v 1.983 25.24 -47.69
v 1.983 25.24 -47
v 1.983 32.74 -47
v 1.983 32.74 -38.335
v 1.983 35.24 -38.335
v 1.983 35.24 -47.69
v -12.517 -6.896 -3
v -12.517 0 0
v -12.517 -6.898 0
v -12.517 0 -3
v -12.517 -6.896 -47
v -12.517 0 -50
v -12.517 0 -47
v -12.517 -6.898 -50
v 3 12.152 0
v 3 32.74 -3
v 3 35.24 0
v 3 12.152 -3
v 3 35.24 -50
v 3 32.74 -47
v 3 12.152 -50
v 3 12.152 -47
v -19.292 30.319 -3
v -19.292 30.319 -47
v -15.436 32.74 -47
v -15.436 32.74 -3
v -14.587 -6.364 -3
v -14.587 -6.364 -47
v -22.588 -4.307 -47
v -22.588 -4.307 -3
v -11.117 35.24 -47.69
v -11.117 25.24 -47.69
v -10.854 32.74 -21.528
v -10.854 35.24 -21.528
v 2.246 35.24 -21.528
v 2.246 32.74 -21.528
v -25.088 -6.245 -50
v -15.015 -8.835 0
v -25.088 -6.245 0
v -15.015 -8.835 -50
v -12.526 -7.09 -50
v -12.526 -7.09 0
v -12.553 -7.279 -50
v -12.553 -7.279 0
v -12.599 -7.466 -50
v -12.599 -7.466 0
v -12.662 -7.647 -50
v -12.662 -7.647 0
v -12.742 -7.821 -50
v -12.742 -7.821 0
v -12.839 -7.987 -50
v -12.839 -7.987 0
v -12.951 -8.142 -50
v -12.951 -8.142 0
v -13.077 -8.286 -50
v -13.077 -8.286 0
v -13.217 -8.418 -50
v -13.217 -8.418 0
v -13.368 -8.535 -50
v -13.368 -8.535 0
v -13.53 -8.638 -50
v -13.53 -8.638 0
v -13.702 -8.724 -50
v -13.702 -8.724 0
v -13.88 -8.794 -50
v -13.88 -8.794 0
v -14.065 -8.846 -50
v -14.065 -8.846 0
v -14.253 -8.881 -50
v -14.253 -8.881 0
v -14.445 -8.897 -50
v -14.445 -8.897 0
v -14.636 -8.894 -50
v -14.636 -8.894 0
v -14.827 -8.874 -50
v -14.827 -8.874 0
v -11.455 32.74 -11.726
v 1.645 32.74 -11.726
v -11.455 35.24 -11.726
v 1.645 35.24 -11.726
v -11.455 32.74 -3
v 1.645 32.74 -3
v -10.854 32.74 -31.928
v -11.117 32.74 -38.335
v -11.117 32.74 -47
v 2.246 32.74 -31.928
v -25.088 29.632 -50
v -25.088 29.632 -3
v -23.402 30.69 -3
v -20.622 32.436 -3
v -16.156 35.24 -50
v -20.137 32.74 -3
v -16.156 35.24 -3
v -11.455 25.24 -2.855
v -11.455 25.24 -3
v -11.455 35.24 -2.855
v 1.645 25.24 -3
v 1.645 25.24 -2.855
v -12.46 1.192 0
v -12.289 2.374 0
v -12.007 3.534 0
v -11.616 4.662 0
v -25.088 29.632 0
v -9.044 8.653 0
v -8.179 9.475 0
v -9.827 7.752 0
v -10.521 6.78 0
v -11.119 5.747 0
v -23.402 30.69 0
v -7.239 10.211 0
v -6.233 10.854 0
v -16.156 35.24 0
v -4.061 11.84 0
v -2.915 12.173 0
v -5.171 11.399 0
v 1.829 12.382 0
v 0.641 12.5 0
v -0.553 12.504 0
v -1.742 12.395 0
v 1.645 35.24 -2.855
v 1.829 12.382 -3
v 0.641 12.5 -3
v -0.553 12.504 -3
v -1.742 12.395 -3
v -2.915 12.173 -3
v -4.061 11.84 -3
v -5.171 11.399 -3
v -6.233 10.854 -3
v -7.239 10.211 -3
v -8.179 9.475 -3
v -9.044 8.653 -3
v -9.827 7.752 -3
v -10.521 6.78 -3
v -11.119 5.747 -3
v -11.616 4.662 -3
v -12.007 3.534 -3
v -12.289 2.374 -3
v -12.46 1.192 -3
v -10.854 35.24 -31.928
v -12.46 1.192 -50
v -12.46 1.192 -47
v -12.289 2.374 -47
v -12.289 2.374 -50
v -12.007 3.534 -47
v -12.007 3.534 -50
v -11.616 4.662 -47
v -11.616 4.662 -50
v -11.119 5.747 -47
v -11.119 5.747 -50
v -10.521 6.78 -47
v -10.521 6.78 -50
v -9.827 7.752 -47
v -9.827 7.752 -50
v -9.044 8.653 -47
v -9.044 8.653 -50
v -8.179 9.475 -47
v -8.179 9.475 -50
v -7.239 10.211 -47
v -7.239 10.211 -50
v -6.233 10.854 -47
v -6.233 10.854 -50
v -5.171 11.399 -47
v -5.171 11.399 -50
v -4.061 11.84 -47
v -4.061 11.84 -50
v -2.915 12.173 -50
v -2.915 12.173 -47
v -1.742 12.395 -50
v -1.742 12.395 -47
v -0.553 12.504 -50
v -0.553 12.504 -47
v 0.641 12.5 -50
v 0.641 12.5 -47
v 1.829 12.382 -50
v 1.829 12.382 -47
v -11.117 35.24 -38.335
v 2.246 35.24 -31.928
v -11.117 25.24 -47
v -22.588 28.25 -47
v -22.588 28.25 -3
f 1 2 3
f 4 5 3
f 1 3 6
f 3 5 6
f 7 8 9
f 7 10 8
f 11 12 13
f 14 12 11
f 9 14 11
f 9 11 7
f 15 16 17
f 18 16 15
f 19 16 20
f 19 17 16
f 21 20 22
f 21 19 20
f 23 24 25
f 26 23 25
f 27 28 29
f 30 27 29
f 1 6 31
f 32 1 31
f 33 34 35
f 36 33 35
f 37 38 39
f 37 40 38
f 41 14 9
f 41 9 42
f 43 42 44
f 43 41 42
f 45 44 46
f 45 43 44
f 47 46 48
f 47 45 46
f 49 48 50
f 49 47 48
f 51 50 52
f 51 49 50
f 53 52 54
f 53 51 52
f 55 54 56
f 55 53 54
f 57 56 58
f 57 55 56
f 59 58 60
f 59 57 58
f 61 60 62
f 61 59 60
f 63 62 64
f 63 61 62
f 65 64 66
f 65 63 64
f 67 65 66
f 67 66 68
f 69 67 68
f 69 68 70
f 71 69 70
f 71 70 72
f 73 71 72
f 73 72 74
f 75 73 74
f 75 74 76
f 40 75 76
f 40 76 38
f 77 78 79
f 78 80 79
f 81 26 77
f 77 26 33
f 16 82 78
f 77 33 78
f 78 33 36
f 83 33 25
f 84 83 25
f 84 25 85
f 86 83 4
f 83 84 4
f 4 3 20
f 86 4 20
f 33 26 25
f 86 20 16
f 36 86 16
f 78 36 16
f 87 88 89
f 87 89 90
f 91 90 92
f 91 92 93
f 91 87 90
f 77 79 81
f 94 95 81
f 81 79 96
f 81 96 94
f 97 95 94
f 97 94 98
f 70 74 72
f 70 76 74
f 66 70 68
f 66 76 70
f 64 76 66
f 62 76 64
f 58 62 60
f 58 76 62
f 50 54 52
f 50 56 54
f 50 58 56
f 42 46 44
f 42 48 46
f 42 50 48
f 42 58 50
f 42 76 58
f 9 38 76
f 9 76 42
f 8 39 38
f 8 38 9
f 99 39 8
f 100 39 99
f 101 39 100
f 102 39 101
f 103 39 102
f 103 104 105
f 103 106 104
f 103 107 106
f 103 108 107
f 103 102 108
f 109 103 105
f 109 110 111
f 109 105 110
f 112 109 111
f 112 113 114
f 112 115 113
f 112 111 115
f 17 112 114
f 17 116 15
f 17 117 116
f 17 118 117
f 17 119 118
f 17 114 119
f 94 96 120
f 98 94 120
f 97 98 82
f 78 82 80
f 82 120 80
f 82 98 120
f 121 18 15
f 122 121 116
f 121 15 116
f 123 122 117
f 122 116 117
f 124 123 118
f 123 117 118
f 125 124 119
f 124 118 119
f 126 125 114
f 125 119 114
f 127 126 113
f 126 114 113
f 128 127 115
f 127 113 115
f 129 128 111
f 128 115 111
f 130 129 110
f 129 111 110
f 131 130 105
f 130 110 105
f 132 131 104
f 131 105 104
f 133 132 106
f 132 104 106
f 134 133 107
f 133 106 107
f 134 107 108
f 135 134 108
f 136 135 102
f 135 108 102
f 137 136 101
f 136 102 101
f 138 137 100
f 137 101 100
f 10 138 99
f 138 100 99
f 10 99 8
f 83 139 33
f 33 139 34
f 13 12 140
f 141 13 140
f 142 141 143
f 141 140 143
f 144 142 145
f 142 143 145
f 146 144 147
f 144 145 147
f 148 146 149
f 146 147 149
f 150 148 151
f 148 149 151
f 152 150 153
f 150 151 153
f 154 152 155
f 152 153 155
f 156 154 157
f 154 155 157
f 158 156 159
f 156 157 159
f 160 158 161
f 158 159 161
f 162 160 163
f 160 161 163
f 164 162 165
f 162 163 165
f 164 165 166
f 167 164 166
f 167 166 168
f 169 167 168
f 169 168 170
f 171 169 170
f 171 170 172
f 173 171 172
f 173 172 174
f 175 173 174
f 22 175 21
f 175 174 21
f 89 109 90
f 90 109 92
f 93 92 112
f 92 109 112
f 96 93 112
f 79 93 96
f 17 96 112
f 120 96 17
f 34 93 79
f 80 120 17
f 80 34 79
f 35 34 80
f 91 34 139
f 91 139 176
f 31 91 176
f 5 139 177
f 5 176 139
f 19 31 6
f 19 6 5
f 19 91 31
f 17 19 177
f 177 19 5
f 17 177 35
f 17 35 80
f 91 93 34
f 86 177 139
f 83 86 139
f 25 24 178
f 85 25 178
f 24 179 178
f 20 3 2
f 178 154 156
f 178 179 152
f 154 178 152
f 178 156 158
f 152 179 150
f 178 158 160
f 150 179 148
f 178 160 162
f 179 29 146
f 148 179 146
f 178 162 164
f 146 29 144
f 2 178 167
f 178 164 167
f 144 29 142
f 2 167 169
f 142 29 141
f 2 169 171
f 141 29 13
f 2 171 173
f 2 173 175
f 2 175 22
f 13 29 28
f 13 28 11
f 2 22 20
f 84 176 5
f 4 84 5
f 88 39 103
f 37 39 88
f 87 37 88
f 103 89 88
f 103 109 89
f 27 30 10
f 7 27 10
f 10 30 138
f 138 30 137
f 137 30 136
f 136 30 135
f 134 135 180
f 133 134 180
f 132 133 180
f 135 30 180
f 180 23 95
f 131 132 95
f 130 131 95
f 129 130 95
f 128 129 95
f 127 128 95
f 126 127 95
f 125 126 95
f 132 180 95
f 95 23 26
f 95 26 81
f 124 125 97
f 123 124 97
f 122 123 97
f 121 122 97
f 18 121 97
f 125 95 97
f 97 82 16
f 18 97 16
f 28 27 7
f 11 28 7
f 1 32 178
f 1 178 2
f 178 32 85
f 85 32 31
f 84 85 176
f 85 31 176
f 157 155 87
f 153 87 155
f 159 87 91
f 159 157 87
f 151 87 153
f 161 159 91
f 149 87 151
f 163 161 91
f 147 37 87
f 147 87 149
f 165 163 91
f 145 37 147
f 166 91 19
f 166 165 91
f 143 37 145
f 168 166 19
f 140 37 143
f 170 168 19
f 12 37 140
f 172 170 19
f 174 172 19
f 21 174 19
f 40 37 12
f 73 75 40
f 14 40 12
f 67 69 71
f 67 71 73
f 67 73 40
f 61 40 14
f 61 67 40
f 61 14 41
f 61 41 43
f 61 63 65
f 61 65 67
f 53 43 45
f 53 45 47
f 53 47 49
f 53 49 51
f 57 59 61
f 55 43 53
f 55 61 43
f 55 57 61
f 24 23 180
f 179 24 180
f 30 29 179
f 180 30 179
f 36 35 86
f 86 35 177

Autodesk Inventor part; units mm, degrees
ref_plane "YZ Plane" through (0, 0, 0) normal (1, 0, 0) x (0, 1, 0)
ref_plane "XZ Plane" through (0, 0, 0) normal (0, 1, 0) x (-1, 0, 0)
ref_plane "XY Plane" through (0, 0, 0) normal (0, 0, 1) x (1, 0, 0)
sketch "Sketch1" plane through (0, 0, 0) normal (0, 0, 1) x (1, 0, 0)
  circle A0 centre (0, 0) radius 11 projected
  line L0 (9.8023, 37.5977) -> (3, 35.24) projected
  line L1 (3, 35.24) -> (3, 11.34) projected
  line L2 (3, 11.34) -> (9, 11.34) projected
  line L3 (9, 11.34) -> (9, 30.1331) projected
  line L4 (9, 30.1331) -> (7.9327, 24.5668) projected
  line L5 (7.9327, 24.5668) -> (7.3445, 24.6796) projected
  line L6 (7.3445, 24.6796) -> (9.8023, 37.5977) projected
  circle A1 centre (0, 0) radius 12.5167
  line L7 (-21, 24.5198) -> (-21, -3.96) projected
  line L8 (-19, -3.96) -> (-21, -3.96) projected
  line L9 (-19, 24.5198) -> (-19, -3.96) projected
  line L10 (-21, 24.5198) -> (-19, 24.5198) projected
  line L11 (-21, 28.5732) -> (-21, 24.5198) projected
  line L12 (-21, 24.5198) -> (-19, 24.5198) projected
  line L13 (-19, 28.5732) -> (-19, 24.5198) projected
  line L14 (-21, 28.5732) -> (-19, 28.5732) projected
  line L15 (1.6453, 33.2633) -> (-11.4547, 33.2633) projected
  line L16 (-19, 0.49) -> (-19, -3.96) projected
  line L17 (-14, 0.49) -> (-19, 0.49) projected
  line L18 (-14, -0.96) -> (-14, 0.49) projected
  arc A2 (-14, -0.96) -> (-11, -3.96) centre (-11, -0.96) ccw projected
  line L19 (-11, -3.96) -> (-19, -3.96) projected
  line L20 (3, 35.24) -> (-21, 35.24)
  line L21 (-11.4547, 35.24) -> (-22.0722, 28.5732)
  line L22 (-22.0722, 28.5732) -> (-23.4016, 30.6904)
  line L23 (-23.4016, 30.6904) -> (-12.7841, 37.3572)
  line L24 (-23.4016, 30.6904) -> (-25.0875, 29.6318)
  line L25 (-25.0875, 29.6318) -> (-25.0875, -6.2453)
  line L26 (-25.0875, -6.2453) -> (-5.3307, -11.3248)
  point P0 (0, 0)
  point P1 (3, 12.1518)
  point P2 (-16.156, 35.24)
  dimension "d0" = 2.5
extrude "Extrusion1" add sketch "Sketch1" against normal blind 3 contours L1 A1 A2 L18 L17 L9 L13 L14 L11 L7 L8 L19 L26 L25 L24 L22 L21 L20 | L21 L22 L23 L20 | A1 L19 L9 L17 L18 A2 | L8 L7 L10 L9 | L11 L14 L13 L10
ref_plane "Work Plane1" through (0, 0, -50) normal (0, 0, -1) x (1, 0, 0)
sketch "Sketch2" plane through (0, 0, -50) normal (0, 0, -1) x (1, 0, 0)
  line L0 (3, -35.24) -> (3, -12.1518) projected
  arc A0 (-5.3307, 11.3248) -> (3, -12.1518) centre (0, 0) ccw projected
  line L1 (-5.3307, 11.3248) -> (-25.0875, 6.2453) projected
  line L2 (-25.0875, 6.2453) -> (-25.0875, -29.6318) projected
  line L3 (-25.0875, -29.6318) -> (-16.156, -35.24) projected
  line L4 (-16.156, -35.24) -> (3, -35.24) projected
  point P0 (0, 0)
extrude "Extrusion2" add sketch "Sketch2" against normal blind 3
sketch "Sketch3" plane through (0, 0, -47) normal (0, 0, 1) x (1, 0, 0)
  line L0 (-25.0875, 29.6318) -> (-25.0875, -6.2453) projected
  line L1 (-25.0875, -6.2453) -> (-5.3307, -11.3248) projected
  arc A0 (3, 12.1518) -> (-5.3307, -11.3248) centre (0, 0) ccw projected
  line L2 (3, 12.1518) -> (3, 35.24) projected
  line L3 (3, 35.24) -> (-16.156, 35.24) projected
  line L4 (-16.156, 35.24) -> (-25.0875, 29.6318) projected
  line L5 (-25.0875, 29.6318) -> (-25.0875, -6.2453) projected
  line L6 (-25.0875, -6.2453) -> (-22.5875, -6.2453)
  line L7 (-22.5875, -6.2453) -> (-22.5875, 29.6318)
  line L8 (-22.5875, 29.6318) -> (-25.0875, 29.6318)
  line L9 (-25.0875, 29.6318) -> (-25.0875, -6.2453)
  line L10 (-16.156, 35.24) -> (-25.0875, 29.6318) projected
  line L11 (-20.6218, 32.4359) -> (-19.2923, 30.3187)
  line L12 (-19.2923, 30.3187) -> (-10.0223, 36.1394)
  line L13 (-10.0223, 36.1394) -> (-28.1615, 24.7497)
  line L14 (3, 12.1518) -> (3, 35.24) projected
  line L15 (3, 35.24) -> (-20.6218, 35.24)
  line L16 (-20.6218, 35.24) -> (-20.6218, 32.74)
  line L17 (-20.6218, 32.74) -> (3, 32.74)
  line L18 (3, 32.74) -> (3, 35.24)
  line L19 (-25.0875, -6.2453) -> (-5.3307, -11.3248) projected
  line L20 (-15.2091, -8.7851) -> (-14.5866, -6.3638)
  line L21 (-14.5866, -6.3638) -> (-34.8376, -1.1573)
  line L22 (-14.5866, -6.3638) -> (7.6026, -12.0686)
  point P0 (0, 0)
  point P1 (-9.9857, -7.5467)
  point P2 (-22.5875, -4.3067)
  point P3 (-22.5875, 28.2496)
  point P4 (-15.4362, 32.74)
  point P5 (3, 32.74)
  dimension "d5" = 2.5
  dimension "d6" = 2.5
  dimension "d7" = 2.5
  dimension "d8" = 2.5
extrude "Extrusion3" add sketch "Sketch3" along normal up to surface (44 mm away) contours L8 L7 L13 L0 | L4 L11 L13 L7 L8 | L13 L7 L21 L0 | L4 L17 L12 L11 | L21 L7 L6 L0 | L4 L3 L12 L17 | L6 L7 L21 L20 L1 | L12 L3 L2 L17 | L20 L22 A0 L1
sketch "Sketch4" plane through (-16.156, 35.24, 0) normal (0, 1, 0) x (1, 0, 0)
  line L0 (19.156, 0) -> (0, 0) projected
  line L1 (19.156, 0) -> (19.156, 50) projected
  line L2 (0, 50) -> (19.156, 50) projected
  line L3 (0, 0) -> (0, 50) projected
  line L4 (18.4023, 21.528) -> (18.4023, 31.928) projected
  line L5 (5.3023, 21.528) -> (18.4023, 21.528) projected
  line L6 (5.3023, 31.928) -> (5.3023, 21.528) projected
  line L7 (18.4023, 31.928) -> (5.3023, 31.928) projected
  line L8 (5.039, 38.3353) -> (18.139, 38.3353) projected
  line L9 (18.139, 38.3353) -> (18.139, 47.6905) projected
  line L10 (5.039, 38.3353) -> (18.139, 38.3353) projected
  line L11 (18.139, 38.3353) -> (18.139, 47.6905) projected
  line L12 (5.039, 38.3353) -> (18.139, 38.3353) projected
  line L13 (5.039, 47.6905) -> (5.039, 38.3353) projected
  line L14 (18.139, 47.6905) -> (5.039, 47.6905) projected
  line L15 (17.8013, 2.855) -> (17.8013, 11.7262) projected
  line L16 (4.7013, 2.855) -> (17.8013, 2.855) projected
  line L17 (4.7013, 11.7262) -> (4.7013, 2.855) projected
  line L18 (17.8013, 11.7262) -> (4.7013, 11.7262) projected
  line L19 (18.4023, 21.528) -> (18.4023, 31.928) projected
  line L20 (5.3023, 21.528) -> (18.4023, 21.528) projected
  line L21 (5.3023, 31.928) -> (5.3023, 21.528) projected
  line L22 (18.4023, 31.928) -> (5.3023, 31.928) projected
  line L23 (5.039, 39.2089) -> (18.139, 39.2089) projected
  line L24 (18.139, 39.2089) -> (18.139, 48.5642) projected
  line L25 (17.8013, 1.8112) -> (17.8013, 10.6824) projected
  line L26 (17.8013, 11.7262) -> (17.8013, 10.6824) projected
  line L27 (17.8013, 11.7262) -> (4.7013, 11.7262) projected
  line L28 (17.8013, 1.8112) -> (17.8013, 10.6824) projected
  line L29 (17.8013, 2.855) -> (17.8013, 1.8112) projected
  point P0 (16.156, 0)
extrude "Extrusion4" cut sketch "Sketch4" against normal blind 10 contours L5 L6 L7 L4 | L13 L23 L9 L8 | L13 L14 L9 L23 | L16 L17 L18 L15
sketch "Sketch5" plane through (0, 0, -50) normal (0, 0, -1) x (-1, 0, 0)
  line L0 (25.0875, -6.2453) -> (25.0875, 29.6318) projected
  line L1 (25.0875, 29.6318) -> (16.156, 35.24) projected
  line L2 (16.156, 35.24) -> (-3, 35.24) projected
  line L3 (-3, 35.24) -> (-3, 12.1518) projected
  arc A0 (5.3307, -11.3248) -> (-3, 12.1518) centre (0, 0) ccw projected
  line L4 (5.3307, -11.3248) -> (25.0875, -6.2453) projected
  arc A1 (9.9857, -7.5467) -> (-3, 12.1518) centre (0, 0) ccw projected
  line L5 (12.5167, 0) -> (12.5167, -6.898)
  line L6 (25.0875, -6.2453) -> (15.0147, -8.835)
  line L7 (5.3307, -11.3248) -> (25.0875, -6.2453) projected
  arc A2 (12.5167, -6.898) -> (15.0147, -8.835) centre (14.5167, -6.898) ccw
  point P0 (0, 0)
  point P1 (12.5167, -9.4773)
  point P2 (15.0147, -8.835)
  point P3 (12.5167, 0)
  dimension "d13" = 2
extrude "Extrusion5" cut sketch "Sketch5" against normal through all contours L4 A0 L5 A2
properties part number "obudowa"
